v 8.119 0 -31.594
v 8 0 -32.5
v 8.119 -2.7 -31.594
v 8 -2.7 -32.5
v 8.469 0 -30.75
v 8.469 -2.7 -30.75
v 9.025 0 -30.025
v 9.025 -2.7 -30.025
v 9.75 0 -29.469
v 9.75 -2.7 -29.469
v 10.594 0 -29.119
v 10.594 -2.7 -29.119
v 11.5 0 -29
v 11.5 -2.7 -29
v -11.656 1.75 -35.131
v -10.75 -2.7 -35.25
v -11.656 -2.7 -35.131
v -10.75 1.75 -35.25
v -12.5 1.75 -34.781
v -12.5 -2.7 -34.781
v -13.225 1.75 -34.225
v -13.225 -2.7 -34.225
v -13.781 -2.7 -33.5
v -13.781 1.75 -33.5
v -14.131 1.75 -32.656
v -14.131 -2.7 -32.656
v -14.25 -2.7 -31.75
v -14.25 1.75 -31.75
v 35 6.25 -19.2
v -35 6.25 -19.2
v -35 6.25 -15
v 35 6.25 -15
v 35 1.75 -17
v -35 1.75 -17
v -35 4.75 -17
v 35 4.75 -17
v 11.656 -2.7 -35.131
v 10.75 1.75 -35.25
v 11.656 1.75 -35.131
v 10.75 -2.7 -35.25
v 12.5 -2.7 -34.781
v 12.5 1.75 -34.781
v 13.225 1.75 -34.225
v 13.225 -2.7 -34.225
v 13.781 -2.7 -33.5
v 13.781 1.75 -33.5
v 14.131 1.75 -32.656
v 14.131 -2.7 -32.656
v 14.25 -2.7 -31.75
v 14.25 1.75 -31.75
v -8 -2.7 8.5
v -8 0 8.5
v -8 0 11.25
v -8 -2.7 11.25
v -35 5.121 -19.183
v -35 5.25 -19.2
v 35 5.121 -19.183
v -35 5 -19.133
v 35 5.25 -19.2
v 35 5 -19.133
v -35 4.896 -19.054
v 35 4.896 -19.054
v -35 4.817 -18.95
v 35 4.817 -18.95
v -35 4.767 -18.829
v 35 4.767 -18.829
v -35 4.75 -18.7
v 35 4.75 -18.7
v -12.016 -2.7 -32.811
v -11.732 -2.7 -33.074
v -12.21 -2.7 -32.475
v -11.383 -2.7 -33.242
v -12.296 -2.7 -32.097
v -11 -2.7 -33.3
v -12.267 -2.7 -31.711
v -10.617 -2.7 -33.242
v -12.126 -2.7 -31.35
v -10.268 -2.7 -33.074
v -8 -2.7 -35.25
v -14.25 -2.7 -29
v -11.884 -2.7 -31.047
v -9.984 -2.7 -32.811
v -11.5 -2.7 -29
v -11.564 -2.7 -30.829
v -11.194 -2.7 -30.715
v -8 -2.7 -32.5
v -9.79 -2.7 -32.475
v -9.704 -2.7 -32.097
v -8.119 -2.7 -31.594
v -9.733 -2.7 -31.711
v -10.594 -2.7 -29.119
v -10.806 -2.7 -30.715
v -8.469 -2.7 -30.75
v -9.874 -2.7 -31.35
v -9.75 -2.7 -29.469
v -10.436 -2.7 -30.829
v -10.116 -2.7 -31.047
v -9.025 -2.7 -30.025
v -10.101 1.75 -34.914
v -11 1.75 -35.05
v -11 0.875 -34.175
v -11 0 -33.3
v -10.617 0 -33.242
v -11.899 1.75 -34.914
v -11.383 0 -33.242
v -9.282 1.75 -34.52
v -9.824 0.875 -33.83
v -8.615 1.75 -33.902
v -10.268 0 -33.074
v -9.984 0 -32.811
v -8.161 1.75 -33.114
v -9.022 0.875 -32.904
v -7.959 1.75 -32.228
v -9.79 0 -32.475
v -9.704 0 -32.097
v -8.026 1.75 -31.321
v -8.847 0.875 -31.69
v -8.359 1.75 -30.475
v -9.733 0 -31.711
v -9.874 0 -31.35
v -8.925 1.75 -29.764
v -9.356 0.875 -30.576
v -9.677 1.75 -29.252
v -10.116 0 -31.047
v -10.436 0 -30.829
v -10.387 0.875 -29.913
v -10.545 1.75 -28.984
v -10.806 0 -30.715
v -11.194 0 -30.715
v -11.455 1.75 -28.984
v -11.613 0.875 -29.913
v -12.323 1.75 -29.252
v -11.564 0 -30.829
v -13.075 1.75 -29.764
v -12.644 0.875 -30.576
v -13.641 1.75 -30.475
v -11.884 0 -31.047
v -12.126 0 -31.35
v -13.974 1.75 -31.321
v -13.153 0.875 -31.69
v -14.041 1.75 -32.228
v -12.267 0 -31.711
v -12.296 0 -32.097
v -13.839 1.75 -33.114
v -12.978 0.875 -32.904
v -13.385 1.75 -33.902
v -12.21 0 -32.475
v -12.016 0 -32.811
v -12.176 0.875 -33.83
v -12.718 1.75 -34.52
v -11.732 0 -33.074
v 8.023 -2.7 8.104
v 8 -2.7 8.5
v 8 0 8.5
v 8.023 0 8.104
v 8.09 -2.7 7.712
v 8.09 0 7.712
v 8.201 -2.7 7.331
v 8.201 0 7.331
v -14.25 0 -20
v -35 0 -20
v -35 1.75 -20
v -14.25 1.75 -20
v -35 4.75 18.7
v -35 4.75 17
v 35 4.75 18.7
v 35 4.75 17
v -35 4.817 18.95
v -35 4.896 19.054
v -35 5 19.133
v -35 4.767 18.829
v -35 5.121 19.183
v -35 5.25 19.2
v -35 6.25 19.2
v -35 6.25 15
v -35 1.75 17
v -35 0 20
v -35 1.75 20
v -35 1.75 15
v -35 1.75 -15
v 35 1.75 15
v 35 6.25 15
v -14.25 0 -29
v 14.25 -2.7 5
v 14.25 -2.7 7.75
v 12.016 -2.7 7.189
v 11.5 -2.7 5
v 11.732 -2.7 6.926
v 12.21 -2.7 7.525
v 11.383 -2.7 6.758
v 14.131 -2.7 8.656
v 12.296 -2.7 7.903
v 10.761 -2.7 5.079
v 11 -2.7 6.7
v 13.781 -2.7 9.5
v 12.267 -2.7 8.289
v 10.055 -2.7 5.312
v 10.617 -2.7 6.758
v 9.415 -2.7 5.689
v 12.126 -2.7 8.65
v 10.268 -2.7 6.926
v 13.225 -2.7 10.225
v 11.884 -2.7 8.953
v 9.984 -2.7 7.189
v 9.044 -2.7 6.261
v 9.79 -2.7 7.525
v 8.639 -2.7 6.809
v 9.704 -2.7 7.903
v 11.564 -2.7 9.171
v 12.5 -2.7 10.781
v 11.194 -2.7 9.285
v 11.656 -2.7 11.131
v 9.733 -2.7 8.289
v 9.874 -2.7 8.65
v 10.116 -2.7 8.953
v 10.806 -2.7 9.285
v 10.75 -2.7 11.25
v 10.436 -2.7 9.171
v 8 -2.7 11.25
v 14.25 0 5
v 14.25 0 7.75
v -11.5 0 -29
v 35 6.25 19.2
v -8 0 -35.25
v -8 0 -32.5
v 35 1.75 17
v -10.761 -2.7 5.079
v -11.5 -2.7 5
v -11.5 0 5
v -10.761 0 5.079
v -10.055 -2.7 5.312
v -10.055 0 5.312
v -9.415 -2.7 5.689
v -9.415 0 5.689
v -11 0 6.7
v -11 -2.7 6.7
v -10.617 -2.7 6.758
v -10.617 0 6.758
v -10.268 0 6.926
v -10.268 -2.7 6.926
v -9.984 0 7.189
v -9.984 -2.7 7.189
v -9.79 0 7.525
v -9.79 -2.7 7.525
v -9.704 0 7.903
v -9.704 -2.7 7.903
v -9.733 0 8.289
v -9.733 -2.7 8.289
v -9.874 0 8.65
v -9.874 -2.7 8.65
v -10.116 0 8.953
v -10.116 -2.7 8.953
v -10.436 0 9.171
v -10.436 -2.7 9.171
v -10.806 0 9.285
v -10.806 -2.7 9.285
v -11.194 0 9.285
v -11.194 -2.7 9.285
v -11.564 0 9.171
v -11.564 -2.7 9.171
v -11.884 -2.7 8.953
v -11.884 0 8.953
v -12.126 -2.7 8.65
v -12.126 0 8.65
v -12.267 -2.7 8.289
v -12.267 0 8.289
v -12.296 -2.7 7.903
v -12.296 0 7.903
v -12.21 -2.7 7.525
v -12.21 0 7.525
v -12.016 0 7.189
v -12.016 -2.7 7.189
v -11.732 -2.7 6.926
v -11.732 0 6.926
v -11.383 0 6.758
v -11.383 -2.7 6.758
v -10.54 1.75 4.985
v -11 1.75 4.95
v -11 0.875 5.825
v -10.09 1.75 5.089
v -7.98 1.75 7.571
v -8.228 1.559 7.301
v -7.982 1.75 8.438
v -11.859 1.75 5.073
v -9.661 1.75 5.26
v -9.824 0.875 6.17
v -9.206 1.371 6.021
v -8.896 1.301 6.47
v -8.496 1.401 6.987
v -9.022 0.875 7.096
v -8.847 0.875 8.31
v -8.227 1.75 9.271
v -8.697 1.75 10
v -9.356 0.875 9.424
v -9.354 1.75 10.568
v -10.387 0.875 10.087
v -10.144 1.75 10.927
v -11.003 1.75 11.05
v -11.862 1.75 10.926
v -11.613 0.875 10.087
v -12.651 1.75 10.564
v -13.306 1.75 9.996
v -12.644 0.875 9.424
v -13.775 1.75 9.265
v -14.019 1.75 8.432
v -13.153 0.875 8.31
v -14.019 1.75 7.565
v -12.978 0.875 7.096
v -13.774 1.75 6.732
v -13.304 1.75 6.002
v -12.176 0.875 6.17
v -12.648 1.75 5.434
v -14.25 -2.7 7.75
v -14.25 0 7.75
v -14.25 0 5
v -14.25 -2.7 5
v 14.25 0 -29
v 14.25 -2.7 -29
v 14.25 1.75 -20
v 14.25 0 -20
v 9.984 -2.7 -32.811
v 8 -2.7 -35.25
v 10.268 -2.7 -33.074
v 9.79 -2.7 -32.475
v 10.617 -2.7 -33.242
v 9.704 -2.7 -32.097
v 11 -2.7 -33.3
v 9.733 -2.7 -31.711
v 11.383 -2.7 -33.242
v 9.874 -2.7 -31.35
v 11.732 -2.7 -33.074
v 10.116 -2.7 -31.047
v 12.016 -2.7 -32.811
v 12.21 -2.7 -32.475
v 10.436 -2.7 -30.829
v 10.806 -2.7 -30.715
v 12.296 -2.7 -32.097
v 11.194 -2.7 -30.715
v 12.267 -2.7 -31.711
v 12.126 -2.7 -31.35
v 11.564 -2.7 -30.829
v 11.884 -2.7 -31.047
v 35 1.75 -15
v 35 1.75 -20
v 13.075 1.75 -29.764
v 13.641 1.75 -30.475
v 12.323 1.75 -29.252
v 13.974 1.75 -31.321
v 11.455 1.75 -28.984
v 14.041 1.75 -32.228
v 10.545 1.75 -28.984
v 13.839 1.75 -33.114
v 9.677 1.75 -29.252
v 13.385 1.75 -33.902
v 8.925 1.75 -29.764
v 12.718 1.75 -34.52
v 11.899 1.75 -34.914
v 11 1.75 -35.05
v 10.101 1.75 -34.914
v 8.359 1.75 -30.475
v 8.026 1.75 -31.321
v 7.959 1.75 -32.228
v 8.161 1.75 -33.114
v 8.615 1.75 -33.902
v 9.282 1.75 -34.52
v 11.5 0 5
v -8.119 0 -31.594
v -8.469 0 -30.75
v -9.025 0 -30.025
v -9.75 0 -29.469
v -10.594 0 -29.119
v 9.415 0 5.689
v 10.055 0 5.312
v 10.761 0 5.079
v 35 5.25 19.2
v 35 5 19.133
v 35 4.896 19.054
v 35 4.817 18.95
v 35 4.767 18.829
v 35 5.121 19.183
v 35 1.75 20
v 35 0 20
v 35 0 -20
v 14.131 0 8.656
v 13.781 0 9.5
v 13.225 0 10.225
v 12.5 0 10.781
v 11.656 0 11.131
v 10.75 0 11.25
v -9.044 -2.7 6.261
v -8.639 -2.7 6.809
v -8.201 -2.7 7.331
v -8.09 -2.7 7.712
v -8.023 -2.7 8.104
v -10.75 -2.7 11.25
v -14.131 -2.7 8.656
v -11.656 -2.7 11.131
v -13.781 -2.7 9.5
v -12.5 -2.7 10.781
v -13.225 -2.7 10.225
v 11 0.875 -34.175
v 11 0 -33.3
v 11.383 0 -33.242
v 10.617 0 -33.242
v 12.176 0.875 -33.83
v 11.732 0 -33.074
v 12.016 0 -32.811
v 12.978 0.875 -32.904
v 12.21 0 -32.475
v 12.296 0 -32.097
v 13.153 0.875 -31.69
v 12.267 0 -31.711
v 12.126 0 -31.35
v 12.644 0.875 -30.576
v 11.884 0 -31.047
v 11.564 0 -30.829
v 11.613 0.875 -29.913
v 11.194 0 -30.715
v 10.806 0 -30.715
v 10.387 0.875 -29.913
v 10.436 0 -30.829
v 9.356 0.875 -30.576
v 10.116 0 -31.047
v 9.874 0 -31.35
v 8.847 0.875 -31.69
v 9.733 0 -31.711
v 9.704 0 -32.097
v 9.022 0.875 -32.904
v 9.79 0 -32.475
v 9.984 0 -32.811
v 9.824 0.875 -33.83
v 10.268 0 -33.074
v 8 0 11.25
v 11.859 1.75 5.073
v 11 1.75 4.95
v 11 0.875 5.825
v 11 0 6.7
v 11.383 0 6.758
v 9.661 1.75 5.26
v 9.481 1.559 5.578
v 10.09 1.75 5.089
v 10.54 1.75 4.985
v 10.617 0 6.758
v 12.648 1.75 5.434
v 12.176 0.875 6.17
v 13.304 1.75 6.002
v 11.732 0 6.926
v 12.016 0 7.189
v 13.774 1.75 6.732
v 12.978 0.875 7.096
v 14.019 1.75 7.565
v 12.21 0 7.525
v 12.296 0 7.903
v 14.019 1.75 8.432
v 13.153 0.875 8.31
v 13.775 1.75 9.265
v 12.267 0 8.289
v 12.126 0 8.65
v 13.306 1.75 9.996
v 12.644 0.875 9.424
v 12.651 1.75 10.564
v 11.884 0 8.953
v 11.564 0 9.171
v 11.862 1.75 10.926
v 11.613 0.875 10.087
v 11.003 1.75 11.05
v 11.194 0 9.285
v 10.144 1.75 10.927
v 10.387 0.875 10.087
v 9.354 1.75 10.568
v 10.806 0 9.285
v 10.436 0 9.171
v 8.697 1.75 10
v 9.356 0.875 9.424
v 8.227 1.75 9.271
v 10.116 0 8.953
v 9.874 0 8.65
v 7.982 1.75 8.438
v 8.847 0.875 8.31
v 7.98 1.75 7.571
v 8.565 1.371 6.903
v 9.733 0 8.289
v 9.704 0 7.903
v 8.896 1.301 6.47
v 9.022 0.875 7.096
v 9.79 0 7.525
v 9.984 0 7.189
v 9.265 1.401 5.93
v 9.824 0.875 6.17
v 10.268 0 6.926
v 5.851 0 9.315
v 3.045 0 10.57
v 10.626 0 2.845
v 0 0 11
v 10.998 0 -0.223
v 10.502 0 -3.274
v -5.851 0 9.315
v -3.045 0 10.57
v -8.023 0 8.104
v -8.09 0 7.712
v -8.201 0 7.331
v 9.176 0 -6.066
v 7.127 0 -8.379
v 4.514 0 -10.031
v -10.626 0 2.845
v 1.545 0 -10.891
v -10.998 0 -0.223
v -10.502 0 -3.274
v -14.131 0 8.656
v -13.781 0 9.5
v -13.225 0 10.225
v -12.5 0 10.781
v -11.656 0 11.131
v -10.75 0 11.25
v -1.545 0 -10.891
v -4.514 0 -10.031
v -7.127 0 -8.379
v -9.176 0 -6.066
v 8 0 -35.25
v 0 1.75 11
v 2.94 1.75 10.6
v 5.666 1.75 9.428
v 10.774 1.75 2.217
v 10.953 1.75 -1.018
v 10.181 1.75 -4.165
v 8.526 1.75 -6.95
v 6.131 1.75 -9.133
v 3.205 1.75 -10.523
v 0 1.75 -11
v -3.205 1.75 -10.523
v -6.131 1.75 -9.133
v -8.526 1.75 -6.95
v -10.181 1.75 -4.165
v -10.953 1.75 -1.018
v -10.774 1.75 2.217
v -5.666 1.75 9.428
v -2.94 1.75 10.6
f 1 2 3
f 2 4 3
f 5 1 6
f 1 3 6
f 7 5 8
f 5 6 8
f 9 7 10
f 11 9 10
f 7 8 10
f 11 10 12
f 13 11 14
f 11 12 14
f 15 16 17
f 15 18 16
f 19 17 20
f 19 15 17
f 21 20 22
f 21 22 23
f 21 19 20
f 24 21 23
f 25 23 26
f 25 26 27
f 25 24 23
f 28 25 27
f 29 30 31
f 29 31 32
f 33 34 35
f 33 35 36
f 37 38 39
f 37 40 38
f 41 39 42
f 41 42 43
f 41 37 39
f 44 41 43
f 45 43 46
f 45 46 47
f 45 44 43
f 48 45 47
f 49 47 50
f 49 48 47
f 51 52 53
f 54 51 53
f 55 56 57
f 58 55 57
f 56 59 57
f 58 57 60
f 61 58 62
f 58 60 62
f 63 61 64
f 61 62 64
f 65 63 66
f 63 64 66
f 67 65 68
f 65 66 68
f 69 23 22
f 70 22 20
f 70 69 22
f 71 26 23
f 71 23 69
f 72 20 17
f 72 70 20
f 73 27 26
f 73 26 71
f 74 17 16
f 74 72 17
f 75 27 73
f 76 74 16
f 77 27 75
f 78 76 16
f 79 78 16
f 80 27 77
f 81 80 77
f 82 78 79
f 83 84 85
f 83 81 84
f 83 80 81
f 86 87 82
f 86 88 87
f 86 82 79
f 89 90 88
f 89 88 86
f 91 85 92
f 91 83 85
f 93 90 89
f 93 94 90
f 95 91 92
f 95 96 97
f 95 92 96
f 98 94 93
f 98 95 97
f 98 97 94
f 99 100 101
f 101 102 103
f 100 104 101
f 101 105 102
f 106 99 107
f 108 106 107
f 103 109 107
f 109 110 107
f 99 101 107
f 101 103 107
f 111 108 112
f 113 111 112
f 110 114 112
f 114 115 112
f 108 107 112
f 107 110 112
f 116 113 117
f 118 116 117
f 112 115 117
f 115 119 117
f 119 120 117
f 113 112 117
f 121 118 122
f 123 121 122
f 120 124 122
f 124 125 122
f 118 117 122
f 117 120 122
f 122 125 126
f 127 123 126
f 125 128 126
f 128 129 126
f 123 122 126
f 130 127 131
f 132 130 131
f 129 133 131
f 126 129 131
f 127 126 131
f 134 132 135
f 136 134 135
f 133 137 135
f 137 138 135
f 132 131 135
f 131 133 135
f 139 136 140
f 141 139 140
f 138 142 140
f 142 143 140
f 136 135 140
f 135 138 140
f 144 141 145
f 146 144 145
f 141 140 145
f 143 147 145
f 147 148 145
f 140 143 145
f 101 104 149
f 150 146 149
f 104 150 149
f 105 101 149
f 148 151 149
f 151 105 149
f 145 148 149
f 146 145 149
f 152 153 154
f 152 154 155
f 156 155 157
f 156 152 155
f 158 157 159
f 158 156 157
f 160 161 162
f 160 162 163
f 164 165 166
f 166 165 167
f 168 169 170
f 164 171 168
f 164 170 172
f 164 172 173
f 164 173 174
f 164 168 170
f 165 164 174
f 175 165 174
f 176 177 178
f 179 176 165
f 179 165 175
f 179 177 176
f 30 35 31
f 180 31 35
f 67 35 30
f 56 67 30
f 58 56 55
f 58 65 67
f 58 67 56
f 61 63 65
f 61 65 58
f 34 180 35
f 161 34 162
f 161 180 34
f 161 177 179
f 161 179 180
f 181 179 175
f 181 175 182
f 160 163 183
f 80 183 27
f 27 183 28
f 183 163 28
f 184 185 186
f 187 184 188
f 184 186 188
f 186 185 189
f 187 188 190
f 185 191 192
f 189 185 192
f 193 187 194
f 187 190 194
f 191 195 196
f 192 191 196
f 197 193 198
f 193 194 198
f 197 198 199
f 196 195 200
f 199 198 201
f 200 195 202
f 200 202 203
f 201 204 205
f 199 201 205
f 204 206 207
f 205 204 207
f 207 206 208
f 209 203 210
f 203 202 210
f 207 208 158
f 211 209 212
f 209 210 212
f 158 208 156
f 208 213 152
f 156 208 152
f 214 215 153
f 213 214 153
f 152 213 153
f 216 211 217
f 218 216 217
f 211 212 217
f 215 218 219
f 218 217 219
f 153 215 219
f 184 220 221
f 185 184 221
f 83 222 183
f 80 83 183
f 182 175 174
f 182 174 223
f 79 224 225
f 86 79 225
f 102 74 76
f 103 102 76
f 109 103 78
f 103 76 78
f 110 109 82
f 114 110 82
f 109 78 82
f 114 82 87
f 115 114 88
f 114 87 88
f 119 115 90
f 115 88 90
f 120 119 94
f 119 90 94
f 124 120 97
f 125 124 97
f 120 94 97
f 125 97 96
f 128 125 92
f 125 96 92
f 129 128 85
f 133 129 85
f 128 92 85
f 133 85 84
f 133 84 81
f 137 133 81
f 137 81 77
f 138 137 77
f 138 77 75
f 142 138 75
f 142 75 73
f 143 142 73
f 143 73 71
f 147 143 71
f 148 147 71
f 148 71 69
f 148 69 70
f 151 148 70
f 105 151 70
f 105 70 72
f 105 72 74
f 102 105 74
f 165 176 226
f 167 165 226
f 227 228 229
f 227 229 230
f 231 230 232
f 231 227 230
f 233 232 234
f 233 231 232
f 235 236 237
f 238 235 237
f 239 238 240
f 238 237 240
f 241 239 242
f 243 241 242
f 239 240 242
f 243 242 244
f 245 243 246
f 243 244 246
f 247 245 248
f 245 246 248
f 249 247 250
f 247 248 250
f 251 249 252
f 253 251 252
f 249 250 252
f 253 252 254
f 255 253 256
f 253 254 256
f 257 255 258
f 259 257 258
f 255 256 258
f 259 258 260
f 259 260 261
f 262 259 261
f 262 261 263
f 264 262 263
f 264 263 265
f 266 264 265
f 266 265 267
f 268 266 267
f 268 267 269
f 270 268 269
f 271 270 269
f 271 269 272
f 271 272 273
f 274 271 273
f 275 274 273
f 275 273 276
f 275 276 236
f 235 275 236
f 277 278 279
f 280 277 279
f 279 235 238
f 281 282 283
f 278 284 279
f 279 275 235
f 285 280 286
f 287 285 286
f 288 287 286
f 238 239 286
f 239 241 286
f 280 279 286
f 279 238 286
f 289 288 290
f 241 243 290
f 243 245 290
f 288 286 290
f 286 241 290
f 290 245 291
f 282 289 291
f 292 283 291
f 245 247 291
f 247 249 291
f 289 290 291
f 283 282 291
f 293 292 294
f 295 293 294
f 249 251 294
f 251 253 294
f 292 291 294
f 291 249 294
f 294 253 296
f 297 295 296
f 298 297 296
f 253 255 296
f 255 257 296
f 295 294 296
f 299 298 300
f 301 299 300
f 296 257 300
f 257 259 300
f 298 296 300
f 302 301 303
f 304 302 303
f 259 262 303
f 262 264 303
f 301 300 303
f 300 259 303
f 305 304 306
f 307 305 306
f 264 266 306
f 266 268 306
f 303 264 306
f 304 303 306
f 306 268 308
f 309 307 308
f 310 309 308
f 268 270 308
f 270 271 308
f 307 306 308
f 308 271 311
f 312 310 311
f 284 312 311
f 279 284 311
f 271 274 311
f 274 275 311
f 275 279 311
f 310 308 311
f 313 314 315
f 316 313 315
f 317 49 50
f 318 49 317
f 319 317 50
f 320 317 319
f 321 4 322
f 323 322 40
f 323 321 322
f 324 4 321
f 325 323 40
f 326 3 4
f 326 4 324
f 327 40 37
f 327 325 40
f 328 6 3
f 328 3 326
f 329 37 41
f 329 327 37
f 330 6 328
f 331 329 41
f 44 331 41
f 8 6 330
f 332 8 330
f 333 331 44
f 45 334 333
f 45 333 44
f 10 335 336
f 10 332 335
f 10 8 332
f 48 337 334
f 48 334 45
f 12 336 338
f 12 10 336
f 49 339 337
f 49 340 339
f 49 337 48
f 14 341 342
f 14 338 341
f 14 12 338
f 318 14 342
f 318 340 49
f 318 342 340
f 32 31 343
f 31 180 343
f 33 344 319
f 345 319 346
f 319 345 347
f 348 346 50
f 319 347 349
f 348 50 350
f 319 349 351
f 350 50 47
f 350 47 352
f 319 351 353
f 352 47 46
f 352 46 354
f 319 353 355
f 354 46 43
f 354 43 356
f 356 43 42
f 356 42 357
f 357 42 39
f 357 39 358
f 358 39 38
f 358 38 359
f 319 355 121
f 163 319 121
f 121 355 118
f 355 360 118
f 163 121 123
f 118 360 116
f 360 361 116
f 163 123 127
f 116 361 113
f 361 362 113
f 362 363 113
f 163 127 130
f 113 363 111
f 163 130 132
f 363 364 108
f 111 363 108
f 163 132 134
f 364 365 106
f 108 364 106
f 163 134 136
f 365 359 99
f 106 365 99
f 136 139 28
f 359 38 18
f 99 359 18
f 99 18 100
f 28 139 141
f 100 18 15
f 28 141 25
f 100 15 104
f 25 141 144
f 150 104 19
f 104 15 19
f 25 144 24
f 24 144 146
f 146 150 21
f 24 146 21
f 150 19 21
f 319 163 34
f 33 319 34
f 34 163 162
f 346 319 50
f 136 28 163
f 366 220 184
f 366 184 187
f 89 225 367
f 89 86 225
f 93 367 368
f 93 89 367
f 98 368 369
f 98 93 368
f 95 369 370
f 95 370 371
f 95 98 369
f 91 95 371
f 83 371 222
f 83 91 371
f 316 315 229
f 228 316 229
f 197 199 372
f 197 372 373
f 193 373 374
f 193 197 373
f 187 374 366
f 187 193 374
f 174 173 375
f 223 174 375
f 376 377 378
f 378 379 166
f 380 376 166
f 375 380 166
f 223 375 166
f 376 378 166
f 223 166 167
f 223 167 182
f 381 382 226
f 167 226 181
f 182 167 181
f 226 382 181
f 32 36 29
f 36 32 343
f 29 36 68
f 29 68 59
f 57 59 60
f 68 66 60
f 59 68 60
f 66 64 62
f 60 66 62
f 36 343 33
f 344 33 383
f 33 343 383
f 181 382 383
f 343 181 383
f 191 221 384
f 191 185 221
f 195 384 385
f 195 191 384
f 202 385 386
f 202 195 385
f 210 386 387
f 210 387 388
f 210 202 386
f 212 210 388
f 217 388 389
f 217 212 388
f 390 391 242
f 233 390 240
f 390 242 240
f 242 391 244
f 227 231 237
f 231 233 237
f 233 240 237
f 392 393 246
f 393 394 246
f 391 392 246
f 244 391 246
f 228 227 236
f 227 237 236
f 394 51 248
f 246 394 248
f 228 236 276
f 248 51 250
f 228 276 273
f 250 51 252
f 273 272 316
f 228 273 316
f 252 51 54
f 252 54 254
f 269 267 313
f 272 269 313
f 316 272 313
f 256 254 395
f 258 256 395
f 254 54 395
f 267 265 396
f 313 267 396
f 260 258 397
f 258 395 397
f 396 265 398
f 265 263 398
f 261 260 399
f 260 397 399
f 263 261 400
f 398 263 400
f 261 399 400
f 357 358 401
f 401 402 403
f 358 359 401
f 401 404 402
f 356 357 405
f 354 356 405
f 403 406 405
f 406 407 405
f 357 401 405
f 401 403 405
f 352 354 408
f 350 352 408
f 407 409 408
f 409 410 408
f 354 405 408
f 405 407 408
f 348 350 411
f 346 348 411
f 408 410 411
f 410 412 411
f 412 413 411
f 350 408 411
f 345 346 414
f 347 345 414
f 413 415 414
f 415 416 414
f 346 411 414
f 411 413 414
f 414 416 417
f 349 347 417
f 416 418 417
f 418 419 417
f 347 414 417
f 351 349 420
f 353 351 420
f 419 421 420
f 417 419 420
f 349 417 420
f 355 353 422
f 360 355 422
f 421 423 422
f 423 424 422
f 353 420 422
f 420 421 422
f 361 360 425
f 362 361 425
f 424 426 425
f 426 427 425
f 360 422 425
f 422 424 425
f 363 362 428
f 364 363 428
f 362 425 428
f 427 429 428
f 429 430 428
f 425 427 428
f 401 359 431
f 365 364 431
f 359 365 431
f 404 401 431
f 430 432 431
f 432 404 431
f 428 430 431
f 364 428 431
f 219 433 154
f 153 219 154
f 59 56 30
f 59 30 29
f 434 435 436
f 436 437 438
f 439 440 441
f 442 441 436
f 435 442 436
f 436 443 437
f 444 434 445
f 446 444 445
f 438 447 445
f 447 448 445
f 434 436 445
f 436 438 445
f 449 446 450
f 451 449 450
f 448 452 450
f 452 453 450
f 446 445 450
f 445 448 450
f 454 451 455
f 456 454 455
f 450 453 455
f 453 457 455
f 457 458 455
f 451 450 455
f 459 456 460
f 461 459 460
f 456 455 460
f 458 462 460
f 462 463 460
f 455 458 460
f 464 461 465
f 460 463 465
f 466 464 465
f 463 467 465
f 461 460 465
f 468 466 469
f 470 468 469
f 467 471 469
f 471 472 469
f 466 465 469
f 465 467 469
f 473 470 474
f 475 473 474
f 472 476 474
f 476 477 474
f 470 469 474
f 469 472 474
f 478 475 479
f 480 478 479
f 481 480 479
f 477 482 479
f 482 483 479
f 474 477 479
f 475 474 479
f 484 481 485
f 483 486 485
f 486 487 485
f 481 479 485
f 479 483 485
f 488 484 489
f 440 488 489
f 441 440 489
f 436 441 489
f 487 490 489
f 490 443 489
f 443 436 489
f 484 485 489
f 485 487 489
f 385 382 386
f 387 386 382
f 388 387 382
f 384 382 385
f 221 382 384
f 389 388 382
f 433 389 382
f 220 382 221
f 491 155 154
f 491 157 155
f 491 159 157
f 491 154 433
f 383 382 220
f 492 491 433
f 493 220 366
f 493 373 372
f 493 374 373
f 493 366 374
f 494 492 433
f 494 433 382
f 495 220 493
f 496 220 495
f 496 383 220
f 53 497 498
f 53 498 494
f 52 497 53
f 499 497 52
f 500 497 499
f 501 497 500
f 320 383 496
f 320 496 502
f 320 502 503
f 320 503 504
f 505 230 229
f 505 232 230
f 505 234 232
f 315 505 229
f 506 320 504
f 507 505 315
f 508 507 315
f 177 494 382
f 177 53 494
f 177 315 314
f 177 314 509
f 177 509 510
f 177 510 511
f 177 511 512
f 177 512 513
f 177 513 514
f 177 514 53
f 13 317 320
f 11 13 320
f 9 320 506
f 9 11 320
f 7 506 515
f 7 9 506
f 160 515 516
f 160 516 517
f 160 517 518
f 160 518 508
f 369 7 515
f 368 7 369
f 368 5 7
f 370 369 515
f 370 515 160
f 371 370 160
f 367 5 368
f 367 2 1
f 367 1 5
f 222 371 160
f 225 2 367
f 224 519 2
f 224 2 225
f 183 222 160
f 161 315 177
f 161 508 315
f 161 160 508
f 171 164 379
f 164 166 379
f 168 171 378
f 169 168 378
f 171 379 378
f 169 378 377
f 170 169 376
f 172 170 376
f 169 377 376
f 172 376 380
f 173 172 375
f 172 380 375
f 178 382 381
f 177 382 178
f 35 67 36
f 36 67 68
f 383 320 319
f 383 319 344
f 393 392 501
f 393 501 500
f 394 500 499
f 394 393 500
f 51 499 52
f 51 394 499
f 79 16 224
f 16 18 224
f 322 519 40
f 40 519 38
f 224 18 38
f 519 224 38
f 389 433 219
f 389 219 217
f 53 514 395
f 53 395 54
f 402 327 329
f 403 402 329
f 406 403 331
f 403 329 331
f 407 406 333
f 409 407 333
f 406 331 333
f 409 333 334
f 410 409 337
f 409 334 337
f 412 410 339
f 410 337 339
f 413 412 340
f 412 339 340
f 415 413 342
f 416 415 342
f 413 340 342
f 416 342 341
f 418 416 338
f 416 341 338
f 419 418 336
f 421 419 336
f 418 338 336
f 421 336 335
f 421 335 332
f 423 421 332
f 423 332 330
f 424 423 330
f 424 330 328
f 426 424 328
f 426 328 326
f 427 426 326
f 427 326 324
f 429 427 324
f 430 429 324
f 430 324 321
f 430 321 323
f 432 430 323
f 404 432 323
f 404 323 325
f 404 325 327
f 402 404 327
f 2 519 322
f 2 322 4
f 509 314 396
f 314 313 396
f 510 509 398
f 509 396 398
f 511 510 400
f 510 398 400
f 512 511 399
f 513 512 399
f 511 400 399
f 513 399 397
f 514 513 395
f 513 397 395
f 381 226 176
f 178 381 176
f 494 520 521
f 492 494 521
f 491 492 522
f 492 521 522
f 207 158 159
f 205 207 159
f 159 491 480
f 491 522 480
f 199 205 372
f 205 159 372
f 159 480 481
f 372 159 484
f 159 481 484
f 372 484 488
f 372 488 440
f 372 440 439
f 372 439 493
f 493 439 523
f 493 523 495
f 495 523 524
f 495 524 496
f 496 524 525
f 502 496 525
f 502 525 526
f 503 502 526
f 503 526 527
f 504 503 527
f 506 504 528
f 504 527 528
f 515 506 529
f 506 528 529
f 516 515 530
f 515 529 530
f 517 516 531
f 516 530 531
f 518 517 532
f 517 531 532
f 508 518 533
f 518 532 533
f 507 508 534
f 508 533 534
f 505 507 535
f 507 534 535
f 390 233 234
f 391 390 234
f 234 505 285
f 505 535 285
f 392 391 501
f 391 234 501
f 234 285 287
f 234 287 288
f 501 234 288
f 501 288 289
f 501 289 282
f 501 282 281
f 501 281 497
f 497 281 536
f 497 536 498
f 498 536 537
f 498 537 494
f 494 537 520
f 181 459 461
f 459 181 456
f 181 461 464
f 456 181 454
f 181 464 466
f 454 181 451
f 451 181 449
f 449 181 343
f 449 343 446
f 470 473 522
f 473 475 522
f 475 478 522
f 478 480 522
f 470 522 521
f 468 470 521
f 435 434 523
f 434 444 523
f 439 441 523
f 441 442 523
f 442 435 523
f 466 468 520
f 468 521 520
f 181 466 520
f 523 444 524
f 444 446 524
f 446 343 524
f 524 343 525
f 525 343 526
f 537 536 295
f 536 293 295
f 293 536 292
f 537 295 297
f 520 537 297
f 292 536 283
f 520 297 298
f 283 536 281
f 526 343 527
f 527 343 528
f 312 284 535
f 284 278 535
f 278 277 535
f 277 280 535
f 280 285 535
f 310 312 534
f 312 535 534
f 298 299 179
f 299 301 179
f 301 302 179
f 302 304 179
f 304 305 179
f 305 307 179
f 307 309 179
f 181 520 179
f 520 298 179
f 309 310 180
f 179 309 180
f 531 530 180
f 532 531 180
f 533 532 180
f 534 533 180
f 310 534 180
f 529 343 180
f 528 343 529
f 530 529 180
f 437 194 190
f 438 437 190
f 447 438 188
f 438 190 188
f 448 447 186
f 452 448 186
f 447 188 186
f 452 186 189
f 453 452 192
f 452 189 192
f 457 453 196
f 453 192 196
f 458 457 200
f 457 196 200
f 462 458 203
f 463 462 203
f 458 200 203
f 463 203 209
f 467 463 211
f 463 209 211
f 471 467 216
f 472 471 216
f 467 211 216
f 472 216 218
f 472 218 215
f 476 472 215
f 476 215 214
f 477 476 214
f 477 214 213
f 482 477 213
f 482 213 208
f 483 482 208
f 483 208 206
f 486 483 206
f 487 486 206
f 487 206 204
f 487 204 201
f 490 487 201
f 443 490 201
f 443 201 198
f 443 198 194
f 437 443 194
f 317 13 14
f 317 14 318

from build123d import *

# Parameters (mm, degrees)
BOSS_EXTRUDE1_DEPTH = 1.75
SKETCH2_W           = 70
SKETCH2_H           = 2
BOSS_EXTRUDE2_DEPTH = 3
SKETCH3_W           = 70
SKETCH3_H           = 4.2
BOSS_EXTRUDE3_DEPTH = 1.5
SKETCH4_W           = 6.25
SKETCH4_H           = 6.25
BOSS_EXTRUDE4_DEPTH = 2.7
SKETCH6_R           = 1.3
CUT_EXTRUDE2_DEPTH  = 51.474399452
FILLET3_R           = 3.5
SKETCH7_R           = 11
CUT_EXTRUDE3_DEPTH  = 50.877976102
CHAMFER1_SIZE       = 1.75
FILLET4_R           = 0.5


with BuildPart() as part:
    # Sketch1 → Boss-Extrude1 (new body)
    with BuildSketch(Plane(origin=(0, 0, 0), x_dir=(1, 0, 0), z_dir=(0, 1, 0))):
        Polygon((35, 20), (35, -20), (-35, -20), (-35, 20), (-14.25, 20), (-14.25, 35.25), (0, 35.25), (14.25, 35.25), (14.25, 20), align=None)
    extrude(amount=BOSS_EXTRUDE1_DEPTH)

    # Sketch2 → Boss-Extrude2 (add)
    with BuildSketch(Plane(origin=(0, 1.75, 0), x_dir=(1, 0, 0), z_dir=(0, 1, 0))):
        with Locations((0, 16)):
            Rectangle(SKETCH2_W, SKETCH2_H)
        with Locations((0, -16)):
            Rectangle(SKETCH2_W, SKETCH2_H)
    extrude(amount=BOSS_EXTRUDE2_DEPTH)

    # Sketch3 → Boss-Extrude3 (add)
    with BuildSketch(Plane(origin=(0, 4.75, 0), x_dir=(1, 0, 0), z_dir=(0, 1, 0))):
        with Locations((0, 17.1)):
            Rectangle(SKETCH3_W, SKETCH3_H)
        with Locations((0, -17.1)):
            Rectangle(SKETCH3_W, SKETCH3_H)
    extrude(amount=BOSS_EXTRUDE3_DEPTH)

    # Sketch4 → Boss-Extrude4 (add)
    with BuildSketch(Plane.XZ):
        Polygon((-11, -35.25), (-8, -35.25), (-8, -32), (-8, -29), (-11, -29), (-14.25, -29), (-14.25, -32), (-14.25, -35.25), align=None)
        with Locations((11.125, -32.125)):
            Rectangle(SKETCH4_W, SKETCH4_H)
        Polygon((14.25, 8), (14.25, 5), (8, 5), (8, 8.25), (8, 11.25), (14.25, 11.25), align=None)
        Polygon((-14.25, 11.25), (-8, 11.25), (-8, 8.25), (-8, 5), (-11, 5), (-14.25, 5), (-14.25, 8), align=None)
    extrude(amount=BOSS_EXTRUDE4_DEPTH)

    # Sketch6 → Cut-Extrude2 (cut, through all)
    with BuildSketch(Plane.XZ.offset(2.7)):
        with Locations(Location((-11, -32, 0), (0, 0, 270))):
            Circle(SKETCH6_R)
        with Locations(Location((11, -32, 0), (0, 0, 270))):
            Circle(SKETCH6_R)
        with Locations(Location((-11, 8, 0), (0, 0, 270))):
            Circle(SKETCH6_R)
        with Locations(Location((11, 8, 0), (0, 0, 270))):
            Circle(SKETCH6_R)
    extrude(amount=-CUT_EXTRUDE2_DEPTH, mode=Mode.SUBTRACT)

    # Fillet3
    fillet3_edges = [part.edges().sort_by_distance(p)[0] for p in [
        (-8, -1.35, 5),
        (-14.25, -1.35, 11.25),
        (8, -1.35, 5),
        (14.25, -1.35, 11.25),
        (-14.25, -0.475, -35.25),
        (14.25, -0.475, -35.25),
        (8, -1.35, -29),
        (-8, -1.35, -29),
    ]]
    fillet(fillet3_edges, radius=FILLET3_R)

    # Sketch7 → Cut-Extrude3 (cut, through all)
    with BuildSketch(Plane(origin=(0, 1.75, 0), x_dir=(1, 0, 0), z_dir=(0, 1, 0))):
        with Locations(Location((0, 0, 0), (0, 0, 270))):
            Circle(SKETCH7_R)
    extrude(amount=-CUT_EXTRUDE3_DEPTH, mode=Mode.SUBTRACT)

    # Chamfer1
    # the kernel refuses this chamfer: 1.75 mm, written as the material it takes off along each edge
    with BuildSketch(Plane(origin=(11, 1.75, -32), x_dir=(0, 0, -1), z_dir=(-1, 0, 0))) as chamfer1_piece_1:
        Polygon((1.3 + CHAMFER1_SIZE, 0), (1.3, CHAMFER1_SIZE), (1.3, 0), align=None)
    revolve(axis=Axis((11, 1.75, -32), (0, -1, 0)), mode=Mode.SUBTRACT)
    with BuildSketch(Plane(origin=(-11, 1.75, 8), x_dir=(0, 0, -1), z_dir=(-1, 0, 0))) as chamfer1_piece_2:
        Polygon((1.3 + CHAMFER1_SIZE, 0), (1.3, CHAMFER1_SIZE), (1.3, 0), align=None)
    revolve(axis=Axis((-11, 1.75, 8), (0, -1, 0)), mode=Mode.SUBTRACT)
    with BuildSketch(Plane(origin=(11, 1.75, 8), x_dir=(0, 0, -1), z_dir=(-1, 0, 0))) as chamfer1_piece_3:
        Polygon((1.3 + CHAMFER1_SIZE, 0), (1.3, CHAMFER1_SIZE), (1.3, 0), align=None)
    revolve(axis=Axis((11, 1.75, 8), (0, -1, 0)), mode=Mode.SUBTRACT)
    with BuildSketch(Plane(origin=(-11, 1.75, -32), x_dir=(0, 0, -1), z_dir=(-1, 0, 0))) as chamfer1_piece_4:
        Polygon((1.3 + CHAMFER1_SIZE, 0), (1.3, CHAMFER1_SIZE), (1.3, 0), align=None)
    revolve(axis=Axis((-11, 1.75, -32), (0, -1, 0)), mode=Mode.SUBTRACT)

    # Fillet4
    fillet4_edges = [part.edges().sort_by_distance(p)[0] for p in [
        (0, 4.75, -19.2),
        (0, 4.75, 19.2),
    ]]
    fillet(fillet4_edges, radius=FILLET4_R)


solid = part.part
